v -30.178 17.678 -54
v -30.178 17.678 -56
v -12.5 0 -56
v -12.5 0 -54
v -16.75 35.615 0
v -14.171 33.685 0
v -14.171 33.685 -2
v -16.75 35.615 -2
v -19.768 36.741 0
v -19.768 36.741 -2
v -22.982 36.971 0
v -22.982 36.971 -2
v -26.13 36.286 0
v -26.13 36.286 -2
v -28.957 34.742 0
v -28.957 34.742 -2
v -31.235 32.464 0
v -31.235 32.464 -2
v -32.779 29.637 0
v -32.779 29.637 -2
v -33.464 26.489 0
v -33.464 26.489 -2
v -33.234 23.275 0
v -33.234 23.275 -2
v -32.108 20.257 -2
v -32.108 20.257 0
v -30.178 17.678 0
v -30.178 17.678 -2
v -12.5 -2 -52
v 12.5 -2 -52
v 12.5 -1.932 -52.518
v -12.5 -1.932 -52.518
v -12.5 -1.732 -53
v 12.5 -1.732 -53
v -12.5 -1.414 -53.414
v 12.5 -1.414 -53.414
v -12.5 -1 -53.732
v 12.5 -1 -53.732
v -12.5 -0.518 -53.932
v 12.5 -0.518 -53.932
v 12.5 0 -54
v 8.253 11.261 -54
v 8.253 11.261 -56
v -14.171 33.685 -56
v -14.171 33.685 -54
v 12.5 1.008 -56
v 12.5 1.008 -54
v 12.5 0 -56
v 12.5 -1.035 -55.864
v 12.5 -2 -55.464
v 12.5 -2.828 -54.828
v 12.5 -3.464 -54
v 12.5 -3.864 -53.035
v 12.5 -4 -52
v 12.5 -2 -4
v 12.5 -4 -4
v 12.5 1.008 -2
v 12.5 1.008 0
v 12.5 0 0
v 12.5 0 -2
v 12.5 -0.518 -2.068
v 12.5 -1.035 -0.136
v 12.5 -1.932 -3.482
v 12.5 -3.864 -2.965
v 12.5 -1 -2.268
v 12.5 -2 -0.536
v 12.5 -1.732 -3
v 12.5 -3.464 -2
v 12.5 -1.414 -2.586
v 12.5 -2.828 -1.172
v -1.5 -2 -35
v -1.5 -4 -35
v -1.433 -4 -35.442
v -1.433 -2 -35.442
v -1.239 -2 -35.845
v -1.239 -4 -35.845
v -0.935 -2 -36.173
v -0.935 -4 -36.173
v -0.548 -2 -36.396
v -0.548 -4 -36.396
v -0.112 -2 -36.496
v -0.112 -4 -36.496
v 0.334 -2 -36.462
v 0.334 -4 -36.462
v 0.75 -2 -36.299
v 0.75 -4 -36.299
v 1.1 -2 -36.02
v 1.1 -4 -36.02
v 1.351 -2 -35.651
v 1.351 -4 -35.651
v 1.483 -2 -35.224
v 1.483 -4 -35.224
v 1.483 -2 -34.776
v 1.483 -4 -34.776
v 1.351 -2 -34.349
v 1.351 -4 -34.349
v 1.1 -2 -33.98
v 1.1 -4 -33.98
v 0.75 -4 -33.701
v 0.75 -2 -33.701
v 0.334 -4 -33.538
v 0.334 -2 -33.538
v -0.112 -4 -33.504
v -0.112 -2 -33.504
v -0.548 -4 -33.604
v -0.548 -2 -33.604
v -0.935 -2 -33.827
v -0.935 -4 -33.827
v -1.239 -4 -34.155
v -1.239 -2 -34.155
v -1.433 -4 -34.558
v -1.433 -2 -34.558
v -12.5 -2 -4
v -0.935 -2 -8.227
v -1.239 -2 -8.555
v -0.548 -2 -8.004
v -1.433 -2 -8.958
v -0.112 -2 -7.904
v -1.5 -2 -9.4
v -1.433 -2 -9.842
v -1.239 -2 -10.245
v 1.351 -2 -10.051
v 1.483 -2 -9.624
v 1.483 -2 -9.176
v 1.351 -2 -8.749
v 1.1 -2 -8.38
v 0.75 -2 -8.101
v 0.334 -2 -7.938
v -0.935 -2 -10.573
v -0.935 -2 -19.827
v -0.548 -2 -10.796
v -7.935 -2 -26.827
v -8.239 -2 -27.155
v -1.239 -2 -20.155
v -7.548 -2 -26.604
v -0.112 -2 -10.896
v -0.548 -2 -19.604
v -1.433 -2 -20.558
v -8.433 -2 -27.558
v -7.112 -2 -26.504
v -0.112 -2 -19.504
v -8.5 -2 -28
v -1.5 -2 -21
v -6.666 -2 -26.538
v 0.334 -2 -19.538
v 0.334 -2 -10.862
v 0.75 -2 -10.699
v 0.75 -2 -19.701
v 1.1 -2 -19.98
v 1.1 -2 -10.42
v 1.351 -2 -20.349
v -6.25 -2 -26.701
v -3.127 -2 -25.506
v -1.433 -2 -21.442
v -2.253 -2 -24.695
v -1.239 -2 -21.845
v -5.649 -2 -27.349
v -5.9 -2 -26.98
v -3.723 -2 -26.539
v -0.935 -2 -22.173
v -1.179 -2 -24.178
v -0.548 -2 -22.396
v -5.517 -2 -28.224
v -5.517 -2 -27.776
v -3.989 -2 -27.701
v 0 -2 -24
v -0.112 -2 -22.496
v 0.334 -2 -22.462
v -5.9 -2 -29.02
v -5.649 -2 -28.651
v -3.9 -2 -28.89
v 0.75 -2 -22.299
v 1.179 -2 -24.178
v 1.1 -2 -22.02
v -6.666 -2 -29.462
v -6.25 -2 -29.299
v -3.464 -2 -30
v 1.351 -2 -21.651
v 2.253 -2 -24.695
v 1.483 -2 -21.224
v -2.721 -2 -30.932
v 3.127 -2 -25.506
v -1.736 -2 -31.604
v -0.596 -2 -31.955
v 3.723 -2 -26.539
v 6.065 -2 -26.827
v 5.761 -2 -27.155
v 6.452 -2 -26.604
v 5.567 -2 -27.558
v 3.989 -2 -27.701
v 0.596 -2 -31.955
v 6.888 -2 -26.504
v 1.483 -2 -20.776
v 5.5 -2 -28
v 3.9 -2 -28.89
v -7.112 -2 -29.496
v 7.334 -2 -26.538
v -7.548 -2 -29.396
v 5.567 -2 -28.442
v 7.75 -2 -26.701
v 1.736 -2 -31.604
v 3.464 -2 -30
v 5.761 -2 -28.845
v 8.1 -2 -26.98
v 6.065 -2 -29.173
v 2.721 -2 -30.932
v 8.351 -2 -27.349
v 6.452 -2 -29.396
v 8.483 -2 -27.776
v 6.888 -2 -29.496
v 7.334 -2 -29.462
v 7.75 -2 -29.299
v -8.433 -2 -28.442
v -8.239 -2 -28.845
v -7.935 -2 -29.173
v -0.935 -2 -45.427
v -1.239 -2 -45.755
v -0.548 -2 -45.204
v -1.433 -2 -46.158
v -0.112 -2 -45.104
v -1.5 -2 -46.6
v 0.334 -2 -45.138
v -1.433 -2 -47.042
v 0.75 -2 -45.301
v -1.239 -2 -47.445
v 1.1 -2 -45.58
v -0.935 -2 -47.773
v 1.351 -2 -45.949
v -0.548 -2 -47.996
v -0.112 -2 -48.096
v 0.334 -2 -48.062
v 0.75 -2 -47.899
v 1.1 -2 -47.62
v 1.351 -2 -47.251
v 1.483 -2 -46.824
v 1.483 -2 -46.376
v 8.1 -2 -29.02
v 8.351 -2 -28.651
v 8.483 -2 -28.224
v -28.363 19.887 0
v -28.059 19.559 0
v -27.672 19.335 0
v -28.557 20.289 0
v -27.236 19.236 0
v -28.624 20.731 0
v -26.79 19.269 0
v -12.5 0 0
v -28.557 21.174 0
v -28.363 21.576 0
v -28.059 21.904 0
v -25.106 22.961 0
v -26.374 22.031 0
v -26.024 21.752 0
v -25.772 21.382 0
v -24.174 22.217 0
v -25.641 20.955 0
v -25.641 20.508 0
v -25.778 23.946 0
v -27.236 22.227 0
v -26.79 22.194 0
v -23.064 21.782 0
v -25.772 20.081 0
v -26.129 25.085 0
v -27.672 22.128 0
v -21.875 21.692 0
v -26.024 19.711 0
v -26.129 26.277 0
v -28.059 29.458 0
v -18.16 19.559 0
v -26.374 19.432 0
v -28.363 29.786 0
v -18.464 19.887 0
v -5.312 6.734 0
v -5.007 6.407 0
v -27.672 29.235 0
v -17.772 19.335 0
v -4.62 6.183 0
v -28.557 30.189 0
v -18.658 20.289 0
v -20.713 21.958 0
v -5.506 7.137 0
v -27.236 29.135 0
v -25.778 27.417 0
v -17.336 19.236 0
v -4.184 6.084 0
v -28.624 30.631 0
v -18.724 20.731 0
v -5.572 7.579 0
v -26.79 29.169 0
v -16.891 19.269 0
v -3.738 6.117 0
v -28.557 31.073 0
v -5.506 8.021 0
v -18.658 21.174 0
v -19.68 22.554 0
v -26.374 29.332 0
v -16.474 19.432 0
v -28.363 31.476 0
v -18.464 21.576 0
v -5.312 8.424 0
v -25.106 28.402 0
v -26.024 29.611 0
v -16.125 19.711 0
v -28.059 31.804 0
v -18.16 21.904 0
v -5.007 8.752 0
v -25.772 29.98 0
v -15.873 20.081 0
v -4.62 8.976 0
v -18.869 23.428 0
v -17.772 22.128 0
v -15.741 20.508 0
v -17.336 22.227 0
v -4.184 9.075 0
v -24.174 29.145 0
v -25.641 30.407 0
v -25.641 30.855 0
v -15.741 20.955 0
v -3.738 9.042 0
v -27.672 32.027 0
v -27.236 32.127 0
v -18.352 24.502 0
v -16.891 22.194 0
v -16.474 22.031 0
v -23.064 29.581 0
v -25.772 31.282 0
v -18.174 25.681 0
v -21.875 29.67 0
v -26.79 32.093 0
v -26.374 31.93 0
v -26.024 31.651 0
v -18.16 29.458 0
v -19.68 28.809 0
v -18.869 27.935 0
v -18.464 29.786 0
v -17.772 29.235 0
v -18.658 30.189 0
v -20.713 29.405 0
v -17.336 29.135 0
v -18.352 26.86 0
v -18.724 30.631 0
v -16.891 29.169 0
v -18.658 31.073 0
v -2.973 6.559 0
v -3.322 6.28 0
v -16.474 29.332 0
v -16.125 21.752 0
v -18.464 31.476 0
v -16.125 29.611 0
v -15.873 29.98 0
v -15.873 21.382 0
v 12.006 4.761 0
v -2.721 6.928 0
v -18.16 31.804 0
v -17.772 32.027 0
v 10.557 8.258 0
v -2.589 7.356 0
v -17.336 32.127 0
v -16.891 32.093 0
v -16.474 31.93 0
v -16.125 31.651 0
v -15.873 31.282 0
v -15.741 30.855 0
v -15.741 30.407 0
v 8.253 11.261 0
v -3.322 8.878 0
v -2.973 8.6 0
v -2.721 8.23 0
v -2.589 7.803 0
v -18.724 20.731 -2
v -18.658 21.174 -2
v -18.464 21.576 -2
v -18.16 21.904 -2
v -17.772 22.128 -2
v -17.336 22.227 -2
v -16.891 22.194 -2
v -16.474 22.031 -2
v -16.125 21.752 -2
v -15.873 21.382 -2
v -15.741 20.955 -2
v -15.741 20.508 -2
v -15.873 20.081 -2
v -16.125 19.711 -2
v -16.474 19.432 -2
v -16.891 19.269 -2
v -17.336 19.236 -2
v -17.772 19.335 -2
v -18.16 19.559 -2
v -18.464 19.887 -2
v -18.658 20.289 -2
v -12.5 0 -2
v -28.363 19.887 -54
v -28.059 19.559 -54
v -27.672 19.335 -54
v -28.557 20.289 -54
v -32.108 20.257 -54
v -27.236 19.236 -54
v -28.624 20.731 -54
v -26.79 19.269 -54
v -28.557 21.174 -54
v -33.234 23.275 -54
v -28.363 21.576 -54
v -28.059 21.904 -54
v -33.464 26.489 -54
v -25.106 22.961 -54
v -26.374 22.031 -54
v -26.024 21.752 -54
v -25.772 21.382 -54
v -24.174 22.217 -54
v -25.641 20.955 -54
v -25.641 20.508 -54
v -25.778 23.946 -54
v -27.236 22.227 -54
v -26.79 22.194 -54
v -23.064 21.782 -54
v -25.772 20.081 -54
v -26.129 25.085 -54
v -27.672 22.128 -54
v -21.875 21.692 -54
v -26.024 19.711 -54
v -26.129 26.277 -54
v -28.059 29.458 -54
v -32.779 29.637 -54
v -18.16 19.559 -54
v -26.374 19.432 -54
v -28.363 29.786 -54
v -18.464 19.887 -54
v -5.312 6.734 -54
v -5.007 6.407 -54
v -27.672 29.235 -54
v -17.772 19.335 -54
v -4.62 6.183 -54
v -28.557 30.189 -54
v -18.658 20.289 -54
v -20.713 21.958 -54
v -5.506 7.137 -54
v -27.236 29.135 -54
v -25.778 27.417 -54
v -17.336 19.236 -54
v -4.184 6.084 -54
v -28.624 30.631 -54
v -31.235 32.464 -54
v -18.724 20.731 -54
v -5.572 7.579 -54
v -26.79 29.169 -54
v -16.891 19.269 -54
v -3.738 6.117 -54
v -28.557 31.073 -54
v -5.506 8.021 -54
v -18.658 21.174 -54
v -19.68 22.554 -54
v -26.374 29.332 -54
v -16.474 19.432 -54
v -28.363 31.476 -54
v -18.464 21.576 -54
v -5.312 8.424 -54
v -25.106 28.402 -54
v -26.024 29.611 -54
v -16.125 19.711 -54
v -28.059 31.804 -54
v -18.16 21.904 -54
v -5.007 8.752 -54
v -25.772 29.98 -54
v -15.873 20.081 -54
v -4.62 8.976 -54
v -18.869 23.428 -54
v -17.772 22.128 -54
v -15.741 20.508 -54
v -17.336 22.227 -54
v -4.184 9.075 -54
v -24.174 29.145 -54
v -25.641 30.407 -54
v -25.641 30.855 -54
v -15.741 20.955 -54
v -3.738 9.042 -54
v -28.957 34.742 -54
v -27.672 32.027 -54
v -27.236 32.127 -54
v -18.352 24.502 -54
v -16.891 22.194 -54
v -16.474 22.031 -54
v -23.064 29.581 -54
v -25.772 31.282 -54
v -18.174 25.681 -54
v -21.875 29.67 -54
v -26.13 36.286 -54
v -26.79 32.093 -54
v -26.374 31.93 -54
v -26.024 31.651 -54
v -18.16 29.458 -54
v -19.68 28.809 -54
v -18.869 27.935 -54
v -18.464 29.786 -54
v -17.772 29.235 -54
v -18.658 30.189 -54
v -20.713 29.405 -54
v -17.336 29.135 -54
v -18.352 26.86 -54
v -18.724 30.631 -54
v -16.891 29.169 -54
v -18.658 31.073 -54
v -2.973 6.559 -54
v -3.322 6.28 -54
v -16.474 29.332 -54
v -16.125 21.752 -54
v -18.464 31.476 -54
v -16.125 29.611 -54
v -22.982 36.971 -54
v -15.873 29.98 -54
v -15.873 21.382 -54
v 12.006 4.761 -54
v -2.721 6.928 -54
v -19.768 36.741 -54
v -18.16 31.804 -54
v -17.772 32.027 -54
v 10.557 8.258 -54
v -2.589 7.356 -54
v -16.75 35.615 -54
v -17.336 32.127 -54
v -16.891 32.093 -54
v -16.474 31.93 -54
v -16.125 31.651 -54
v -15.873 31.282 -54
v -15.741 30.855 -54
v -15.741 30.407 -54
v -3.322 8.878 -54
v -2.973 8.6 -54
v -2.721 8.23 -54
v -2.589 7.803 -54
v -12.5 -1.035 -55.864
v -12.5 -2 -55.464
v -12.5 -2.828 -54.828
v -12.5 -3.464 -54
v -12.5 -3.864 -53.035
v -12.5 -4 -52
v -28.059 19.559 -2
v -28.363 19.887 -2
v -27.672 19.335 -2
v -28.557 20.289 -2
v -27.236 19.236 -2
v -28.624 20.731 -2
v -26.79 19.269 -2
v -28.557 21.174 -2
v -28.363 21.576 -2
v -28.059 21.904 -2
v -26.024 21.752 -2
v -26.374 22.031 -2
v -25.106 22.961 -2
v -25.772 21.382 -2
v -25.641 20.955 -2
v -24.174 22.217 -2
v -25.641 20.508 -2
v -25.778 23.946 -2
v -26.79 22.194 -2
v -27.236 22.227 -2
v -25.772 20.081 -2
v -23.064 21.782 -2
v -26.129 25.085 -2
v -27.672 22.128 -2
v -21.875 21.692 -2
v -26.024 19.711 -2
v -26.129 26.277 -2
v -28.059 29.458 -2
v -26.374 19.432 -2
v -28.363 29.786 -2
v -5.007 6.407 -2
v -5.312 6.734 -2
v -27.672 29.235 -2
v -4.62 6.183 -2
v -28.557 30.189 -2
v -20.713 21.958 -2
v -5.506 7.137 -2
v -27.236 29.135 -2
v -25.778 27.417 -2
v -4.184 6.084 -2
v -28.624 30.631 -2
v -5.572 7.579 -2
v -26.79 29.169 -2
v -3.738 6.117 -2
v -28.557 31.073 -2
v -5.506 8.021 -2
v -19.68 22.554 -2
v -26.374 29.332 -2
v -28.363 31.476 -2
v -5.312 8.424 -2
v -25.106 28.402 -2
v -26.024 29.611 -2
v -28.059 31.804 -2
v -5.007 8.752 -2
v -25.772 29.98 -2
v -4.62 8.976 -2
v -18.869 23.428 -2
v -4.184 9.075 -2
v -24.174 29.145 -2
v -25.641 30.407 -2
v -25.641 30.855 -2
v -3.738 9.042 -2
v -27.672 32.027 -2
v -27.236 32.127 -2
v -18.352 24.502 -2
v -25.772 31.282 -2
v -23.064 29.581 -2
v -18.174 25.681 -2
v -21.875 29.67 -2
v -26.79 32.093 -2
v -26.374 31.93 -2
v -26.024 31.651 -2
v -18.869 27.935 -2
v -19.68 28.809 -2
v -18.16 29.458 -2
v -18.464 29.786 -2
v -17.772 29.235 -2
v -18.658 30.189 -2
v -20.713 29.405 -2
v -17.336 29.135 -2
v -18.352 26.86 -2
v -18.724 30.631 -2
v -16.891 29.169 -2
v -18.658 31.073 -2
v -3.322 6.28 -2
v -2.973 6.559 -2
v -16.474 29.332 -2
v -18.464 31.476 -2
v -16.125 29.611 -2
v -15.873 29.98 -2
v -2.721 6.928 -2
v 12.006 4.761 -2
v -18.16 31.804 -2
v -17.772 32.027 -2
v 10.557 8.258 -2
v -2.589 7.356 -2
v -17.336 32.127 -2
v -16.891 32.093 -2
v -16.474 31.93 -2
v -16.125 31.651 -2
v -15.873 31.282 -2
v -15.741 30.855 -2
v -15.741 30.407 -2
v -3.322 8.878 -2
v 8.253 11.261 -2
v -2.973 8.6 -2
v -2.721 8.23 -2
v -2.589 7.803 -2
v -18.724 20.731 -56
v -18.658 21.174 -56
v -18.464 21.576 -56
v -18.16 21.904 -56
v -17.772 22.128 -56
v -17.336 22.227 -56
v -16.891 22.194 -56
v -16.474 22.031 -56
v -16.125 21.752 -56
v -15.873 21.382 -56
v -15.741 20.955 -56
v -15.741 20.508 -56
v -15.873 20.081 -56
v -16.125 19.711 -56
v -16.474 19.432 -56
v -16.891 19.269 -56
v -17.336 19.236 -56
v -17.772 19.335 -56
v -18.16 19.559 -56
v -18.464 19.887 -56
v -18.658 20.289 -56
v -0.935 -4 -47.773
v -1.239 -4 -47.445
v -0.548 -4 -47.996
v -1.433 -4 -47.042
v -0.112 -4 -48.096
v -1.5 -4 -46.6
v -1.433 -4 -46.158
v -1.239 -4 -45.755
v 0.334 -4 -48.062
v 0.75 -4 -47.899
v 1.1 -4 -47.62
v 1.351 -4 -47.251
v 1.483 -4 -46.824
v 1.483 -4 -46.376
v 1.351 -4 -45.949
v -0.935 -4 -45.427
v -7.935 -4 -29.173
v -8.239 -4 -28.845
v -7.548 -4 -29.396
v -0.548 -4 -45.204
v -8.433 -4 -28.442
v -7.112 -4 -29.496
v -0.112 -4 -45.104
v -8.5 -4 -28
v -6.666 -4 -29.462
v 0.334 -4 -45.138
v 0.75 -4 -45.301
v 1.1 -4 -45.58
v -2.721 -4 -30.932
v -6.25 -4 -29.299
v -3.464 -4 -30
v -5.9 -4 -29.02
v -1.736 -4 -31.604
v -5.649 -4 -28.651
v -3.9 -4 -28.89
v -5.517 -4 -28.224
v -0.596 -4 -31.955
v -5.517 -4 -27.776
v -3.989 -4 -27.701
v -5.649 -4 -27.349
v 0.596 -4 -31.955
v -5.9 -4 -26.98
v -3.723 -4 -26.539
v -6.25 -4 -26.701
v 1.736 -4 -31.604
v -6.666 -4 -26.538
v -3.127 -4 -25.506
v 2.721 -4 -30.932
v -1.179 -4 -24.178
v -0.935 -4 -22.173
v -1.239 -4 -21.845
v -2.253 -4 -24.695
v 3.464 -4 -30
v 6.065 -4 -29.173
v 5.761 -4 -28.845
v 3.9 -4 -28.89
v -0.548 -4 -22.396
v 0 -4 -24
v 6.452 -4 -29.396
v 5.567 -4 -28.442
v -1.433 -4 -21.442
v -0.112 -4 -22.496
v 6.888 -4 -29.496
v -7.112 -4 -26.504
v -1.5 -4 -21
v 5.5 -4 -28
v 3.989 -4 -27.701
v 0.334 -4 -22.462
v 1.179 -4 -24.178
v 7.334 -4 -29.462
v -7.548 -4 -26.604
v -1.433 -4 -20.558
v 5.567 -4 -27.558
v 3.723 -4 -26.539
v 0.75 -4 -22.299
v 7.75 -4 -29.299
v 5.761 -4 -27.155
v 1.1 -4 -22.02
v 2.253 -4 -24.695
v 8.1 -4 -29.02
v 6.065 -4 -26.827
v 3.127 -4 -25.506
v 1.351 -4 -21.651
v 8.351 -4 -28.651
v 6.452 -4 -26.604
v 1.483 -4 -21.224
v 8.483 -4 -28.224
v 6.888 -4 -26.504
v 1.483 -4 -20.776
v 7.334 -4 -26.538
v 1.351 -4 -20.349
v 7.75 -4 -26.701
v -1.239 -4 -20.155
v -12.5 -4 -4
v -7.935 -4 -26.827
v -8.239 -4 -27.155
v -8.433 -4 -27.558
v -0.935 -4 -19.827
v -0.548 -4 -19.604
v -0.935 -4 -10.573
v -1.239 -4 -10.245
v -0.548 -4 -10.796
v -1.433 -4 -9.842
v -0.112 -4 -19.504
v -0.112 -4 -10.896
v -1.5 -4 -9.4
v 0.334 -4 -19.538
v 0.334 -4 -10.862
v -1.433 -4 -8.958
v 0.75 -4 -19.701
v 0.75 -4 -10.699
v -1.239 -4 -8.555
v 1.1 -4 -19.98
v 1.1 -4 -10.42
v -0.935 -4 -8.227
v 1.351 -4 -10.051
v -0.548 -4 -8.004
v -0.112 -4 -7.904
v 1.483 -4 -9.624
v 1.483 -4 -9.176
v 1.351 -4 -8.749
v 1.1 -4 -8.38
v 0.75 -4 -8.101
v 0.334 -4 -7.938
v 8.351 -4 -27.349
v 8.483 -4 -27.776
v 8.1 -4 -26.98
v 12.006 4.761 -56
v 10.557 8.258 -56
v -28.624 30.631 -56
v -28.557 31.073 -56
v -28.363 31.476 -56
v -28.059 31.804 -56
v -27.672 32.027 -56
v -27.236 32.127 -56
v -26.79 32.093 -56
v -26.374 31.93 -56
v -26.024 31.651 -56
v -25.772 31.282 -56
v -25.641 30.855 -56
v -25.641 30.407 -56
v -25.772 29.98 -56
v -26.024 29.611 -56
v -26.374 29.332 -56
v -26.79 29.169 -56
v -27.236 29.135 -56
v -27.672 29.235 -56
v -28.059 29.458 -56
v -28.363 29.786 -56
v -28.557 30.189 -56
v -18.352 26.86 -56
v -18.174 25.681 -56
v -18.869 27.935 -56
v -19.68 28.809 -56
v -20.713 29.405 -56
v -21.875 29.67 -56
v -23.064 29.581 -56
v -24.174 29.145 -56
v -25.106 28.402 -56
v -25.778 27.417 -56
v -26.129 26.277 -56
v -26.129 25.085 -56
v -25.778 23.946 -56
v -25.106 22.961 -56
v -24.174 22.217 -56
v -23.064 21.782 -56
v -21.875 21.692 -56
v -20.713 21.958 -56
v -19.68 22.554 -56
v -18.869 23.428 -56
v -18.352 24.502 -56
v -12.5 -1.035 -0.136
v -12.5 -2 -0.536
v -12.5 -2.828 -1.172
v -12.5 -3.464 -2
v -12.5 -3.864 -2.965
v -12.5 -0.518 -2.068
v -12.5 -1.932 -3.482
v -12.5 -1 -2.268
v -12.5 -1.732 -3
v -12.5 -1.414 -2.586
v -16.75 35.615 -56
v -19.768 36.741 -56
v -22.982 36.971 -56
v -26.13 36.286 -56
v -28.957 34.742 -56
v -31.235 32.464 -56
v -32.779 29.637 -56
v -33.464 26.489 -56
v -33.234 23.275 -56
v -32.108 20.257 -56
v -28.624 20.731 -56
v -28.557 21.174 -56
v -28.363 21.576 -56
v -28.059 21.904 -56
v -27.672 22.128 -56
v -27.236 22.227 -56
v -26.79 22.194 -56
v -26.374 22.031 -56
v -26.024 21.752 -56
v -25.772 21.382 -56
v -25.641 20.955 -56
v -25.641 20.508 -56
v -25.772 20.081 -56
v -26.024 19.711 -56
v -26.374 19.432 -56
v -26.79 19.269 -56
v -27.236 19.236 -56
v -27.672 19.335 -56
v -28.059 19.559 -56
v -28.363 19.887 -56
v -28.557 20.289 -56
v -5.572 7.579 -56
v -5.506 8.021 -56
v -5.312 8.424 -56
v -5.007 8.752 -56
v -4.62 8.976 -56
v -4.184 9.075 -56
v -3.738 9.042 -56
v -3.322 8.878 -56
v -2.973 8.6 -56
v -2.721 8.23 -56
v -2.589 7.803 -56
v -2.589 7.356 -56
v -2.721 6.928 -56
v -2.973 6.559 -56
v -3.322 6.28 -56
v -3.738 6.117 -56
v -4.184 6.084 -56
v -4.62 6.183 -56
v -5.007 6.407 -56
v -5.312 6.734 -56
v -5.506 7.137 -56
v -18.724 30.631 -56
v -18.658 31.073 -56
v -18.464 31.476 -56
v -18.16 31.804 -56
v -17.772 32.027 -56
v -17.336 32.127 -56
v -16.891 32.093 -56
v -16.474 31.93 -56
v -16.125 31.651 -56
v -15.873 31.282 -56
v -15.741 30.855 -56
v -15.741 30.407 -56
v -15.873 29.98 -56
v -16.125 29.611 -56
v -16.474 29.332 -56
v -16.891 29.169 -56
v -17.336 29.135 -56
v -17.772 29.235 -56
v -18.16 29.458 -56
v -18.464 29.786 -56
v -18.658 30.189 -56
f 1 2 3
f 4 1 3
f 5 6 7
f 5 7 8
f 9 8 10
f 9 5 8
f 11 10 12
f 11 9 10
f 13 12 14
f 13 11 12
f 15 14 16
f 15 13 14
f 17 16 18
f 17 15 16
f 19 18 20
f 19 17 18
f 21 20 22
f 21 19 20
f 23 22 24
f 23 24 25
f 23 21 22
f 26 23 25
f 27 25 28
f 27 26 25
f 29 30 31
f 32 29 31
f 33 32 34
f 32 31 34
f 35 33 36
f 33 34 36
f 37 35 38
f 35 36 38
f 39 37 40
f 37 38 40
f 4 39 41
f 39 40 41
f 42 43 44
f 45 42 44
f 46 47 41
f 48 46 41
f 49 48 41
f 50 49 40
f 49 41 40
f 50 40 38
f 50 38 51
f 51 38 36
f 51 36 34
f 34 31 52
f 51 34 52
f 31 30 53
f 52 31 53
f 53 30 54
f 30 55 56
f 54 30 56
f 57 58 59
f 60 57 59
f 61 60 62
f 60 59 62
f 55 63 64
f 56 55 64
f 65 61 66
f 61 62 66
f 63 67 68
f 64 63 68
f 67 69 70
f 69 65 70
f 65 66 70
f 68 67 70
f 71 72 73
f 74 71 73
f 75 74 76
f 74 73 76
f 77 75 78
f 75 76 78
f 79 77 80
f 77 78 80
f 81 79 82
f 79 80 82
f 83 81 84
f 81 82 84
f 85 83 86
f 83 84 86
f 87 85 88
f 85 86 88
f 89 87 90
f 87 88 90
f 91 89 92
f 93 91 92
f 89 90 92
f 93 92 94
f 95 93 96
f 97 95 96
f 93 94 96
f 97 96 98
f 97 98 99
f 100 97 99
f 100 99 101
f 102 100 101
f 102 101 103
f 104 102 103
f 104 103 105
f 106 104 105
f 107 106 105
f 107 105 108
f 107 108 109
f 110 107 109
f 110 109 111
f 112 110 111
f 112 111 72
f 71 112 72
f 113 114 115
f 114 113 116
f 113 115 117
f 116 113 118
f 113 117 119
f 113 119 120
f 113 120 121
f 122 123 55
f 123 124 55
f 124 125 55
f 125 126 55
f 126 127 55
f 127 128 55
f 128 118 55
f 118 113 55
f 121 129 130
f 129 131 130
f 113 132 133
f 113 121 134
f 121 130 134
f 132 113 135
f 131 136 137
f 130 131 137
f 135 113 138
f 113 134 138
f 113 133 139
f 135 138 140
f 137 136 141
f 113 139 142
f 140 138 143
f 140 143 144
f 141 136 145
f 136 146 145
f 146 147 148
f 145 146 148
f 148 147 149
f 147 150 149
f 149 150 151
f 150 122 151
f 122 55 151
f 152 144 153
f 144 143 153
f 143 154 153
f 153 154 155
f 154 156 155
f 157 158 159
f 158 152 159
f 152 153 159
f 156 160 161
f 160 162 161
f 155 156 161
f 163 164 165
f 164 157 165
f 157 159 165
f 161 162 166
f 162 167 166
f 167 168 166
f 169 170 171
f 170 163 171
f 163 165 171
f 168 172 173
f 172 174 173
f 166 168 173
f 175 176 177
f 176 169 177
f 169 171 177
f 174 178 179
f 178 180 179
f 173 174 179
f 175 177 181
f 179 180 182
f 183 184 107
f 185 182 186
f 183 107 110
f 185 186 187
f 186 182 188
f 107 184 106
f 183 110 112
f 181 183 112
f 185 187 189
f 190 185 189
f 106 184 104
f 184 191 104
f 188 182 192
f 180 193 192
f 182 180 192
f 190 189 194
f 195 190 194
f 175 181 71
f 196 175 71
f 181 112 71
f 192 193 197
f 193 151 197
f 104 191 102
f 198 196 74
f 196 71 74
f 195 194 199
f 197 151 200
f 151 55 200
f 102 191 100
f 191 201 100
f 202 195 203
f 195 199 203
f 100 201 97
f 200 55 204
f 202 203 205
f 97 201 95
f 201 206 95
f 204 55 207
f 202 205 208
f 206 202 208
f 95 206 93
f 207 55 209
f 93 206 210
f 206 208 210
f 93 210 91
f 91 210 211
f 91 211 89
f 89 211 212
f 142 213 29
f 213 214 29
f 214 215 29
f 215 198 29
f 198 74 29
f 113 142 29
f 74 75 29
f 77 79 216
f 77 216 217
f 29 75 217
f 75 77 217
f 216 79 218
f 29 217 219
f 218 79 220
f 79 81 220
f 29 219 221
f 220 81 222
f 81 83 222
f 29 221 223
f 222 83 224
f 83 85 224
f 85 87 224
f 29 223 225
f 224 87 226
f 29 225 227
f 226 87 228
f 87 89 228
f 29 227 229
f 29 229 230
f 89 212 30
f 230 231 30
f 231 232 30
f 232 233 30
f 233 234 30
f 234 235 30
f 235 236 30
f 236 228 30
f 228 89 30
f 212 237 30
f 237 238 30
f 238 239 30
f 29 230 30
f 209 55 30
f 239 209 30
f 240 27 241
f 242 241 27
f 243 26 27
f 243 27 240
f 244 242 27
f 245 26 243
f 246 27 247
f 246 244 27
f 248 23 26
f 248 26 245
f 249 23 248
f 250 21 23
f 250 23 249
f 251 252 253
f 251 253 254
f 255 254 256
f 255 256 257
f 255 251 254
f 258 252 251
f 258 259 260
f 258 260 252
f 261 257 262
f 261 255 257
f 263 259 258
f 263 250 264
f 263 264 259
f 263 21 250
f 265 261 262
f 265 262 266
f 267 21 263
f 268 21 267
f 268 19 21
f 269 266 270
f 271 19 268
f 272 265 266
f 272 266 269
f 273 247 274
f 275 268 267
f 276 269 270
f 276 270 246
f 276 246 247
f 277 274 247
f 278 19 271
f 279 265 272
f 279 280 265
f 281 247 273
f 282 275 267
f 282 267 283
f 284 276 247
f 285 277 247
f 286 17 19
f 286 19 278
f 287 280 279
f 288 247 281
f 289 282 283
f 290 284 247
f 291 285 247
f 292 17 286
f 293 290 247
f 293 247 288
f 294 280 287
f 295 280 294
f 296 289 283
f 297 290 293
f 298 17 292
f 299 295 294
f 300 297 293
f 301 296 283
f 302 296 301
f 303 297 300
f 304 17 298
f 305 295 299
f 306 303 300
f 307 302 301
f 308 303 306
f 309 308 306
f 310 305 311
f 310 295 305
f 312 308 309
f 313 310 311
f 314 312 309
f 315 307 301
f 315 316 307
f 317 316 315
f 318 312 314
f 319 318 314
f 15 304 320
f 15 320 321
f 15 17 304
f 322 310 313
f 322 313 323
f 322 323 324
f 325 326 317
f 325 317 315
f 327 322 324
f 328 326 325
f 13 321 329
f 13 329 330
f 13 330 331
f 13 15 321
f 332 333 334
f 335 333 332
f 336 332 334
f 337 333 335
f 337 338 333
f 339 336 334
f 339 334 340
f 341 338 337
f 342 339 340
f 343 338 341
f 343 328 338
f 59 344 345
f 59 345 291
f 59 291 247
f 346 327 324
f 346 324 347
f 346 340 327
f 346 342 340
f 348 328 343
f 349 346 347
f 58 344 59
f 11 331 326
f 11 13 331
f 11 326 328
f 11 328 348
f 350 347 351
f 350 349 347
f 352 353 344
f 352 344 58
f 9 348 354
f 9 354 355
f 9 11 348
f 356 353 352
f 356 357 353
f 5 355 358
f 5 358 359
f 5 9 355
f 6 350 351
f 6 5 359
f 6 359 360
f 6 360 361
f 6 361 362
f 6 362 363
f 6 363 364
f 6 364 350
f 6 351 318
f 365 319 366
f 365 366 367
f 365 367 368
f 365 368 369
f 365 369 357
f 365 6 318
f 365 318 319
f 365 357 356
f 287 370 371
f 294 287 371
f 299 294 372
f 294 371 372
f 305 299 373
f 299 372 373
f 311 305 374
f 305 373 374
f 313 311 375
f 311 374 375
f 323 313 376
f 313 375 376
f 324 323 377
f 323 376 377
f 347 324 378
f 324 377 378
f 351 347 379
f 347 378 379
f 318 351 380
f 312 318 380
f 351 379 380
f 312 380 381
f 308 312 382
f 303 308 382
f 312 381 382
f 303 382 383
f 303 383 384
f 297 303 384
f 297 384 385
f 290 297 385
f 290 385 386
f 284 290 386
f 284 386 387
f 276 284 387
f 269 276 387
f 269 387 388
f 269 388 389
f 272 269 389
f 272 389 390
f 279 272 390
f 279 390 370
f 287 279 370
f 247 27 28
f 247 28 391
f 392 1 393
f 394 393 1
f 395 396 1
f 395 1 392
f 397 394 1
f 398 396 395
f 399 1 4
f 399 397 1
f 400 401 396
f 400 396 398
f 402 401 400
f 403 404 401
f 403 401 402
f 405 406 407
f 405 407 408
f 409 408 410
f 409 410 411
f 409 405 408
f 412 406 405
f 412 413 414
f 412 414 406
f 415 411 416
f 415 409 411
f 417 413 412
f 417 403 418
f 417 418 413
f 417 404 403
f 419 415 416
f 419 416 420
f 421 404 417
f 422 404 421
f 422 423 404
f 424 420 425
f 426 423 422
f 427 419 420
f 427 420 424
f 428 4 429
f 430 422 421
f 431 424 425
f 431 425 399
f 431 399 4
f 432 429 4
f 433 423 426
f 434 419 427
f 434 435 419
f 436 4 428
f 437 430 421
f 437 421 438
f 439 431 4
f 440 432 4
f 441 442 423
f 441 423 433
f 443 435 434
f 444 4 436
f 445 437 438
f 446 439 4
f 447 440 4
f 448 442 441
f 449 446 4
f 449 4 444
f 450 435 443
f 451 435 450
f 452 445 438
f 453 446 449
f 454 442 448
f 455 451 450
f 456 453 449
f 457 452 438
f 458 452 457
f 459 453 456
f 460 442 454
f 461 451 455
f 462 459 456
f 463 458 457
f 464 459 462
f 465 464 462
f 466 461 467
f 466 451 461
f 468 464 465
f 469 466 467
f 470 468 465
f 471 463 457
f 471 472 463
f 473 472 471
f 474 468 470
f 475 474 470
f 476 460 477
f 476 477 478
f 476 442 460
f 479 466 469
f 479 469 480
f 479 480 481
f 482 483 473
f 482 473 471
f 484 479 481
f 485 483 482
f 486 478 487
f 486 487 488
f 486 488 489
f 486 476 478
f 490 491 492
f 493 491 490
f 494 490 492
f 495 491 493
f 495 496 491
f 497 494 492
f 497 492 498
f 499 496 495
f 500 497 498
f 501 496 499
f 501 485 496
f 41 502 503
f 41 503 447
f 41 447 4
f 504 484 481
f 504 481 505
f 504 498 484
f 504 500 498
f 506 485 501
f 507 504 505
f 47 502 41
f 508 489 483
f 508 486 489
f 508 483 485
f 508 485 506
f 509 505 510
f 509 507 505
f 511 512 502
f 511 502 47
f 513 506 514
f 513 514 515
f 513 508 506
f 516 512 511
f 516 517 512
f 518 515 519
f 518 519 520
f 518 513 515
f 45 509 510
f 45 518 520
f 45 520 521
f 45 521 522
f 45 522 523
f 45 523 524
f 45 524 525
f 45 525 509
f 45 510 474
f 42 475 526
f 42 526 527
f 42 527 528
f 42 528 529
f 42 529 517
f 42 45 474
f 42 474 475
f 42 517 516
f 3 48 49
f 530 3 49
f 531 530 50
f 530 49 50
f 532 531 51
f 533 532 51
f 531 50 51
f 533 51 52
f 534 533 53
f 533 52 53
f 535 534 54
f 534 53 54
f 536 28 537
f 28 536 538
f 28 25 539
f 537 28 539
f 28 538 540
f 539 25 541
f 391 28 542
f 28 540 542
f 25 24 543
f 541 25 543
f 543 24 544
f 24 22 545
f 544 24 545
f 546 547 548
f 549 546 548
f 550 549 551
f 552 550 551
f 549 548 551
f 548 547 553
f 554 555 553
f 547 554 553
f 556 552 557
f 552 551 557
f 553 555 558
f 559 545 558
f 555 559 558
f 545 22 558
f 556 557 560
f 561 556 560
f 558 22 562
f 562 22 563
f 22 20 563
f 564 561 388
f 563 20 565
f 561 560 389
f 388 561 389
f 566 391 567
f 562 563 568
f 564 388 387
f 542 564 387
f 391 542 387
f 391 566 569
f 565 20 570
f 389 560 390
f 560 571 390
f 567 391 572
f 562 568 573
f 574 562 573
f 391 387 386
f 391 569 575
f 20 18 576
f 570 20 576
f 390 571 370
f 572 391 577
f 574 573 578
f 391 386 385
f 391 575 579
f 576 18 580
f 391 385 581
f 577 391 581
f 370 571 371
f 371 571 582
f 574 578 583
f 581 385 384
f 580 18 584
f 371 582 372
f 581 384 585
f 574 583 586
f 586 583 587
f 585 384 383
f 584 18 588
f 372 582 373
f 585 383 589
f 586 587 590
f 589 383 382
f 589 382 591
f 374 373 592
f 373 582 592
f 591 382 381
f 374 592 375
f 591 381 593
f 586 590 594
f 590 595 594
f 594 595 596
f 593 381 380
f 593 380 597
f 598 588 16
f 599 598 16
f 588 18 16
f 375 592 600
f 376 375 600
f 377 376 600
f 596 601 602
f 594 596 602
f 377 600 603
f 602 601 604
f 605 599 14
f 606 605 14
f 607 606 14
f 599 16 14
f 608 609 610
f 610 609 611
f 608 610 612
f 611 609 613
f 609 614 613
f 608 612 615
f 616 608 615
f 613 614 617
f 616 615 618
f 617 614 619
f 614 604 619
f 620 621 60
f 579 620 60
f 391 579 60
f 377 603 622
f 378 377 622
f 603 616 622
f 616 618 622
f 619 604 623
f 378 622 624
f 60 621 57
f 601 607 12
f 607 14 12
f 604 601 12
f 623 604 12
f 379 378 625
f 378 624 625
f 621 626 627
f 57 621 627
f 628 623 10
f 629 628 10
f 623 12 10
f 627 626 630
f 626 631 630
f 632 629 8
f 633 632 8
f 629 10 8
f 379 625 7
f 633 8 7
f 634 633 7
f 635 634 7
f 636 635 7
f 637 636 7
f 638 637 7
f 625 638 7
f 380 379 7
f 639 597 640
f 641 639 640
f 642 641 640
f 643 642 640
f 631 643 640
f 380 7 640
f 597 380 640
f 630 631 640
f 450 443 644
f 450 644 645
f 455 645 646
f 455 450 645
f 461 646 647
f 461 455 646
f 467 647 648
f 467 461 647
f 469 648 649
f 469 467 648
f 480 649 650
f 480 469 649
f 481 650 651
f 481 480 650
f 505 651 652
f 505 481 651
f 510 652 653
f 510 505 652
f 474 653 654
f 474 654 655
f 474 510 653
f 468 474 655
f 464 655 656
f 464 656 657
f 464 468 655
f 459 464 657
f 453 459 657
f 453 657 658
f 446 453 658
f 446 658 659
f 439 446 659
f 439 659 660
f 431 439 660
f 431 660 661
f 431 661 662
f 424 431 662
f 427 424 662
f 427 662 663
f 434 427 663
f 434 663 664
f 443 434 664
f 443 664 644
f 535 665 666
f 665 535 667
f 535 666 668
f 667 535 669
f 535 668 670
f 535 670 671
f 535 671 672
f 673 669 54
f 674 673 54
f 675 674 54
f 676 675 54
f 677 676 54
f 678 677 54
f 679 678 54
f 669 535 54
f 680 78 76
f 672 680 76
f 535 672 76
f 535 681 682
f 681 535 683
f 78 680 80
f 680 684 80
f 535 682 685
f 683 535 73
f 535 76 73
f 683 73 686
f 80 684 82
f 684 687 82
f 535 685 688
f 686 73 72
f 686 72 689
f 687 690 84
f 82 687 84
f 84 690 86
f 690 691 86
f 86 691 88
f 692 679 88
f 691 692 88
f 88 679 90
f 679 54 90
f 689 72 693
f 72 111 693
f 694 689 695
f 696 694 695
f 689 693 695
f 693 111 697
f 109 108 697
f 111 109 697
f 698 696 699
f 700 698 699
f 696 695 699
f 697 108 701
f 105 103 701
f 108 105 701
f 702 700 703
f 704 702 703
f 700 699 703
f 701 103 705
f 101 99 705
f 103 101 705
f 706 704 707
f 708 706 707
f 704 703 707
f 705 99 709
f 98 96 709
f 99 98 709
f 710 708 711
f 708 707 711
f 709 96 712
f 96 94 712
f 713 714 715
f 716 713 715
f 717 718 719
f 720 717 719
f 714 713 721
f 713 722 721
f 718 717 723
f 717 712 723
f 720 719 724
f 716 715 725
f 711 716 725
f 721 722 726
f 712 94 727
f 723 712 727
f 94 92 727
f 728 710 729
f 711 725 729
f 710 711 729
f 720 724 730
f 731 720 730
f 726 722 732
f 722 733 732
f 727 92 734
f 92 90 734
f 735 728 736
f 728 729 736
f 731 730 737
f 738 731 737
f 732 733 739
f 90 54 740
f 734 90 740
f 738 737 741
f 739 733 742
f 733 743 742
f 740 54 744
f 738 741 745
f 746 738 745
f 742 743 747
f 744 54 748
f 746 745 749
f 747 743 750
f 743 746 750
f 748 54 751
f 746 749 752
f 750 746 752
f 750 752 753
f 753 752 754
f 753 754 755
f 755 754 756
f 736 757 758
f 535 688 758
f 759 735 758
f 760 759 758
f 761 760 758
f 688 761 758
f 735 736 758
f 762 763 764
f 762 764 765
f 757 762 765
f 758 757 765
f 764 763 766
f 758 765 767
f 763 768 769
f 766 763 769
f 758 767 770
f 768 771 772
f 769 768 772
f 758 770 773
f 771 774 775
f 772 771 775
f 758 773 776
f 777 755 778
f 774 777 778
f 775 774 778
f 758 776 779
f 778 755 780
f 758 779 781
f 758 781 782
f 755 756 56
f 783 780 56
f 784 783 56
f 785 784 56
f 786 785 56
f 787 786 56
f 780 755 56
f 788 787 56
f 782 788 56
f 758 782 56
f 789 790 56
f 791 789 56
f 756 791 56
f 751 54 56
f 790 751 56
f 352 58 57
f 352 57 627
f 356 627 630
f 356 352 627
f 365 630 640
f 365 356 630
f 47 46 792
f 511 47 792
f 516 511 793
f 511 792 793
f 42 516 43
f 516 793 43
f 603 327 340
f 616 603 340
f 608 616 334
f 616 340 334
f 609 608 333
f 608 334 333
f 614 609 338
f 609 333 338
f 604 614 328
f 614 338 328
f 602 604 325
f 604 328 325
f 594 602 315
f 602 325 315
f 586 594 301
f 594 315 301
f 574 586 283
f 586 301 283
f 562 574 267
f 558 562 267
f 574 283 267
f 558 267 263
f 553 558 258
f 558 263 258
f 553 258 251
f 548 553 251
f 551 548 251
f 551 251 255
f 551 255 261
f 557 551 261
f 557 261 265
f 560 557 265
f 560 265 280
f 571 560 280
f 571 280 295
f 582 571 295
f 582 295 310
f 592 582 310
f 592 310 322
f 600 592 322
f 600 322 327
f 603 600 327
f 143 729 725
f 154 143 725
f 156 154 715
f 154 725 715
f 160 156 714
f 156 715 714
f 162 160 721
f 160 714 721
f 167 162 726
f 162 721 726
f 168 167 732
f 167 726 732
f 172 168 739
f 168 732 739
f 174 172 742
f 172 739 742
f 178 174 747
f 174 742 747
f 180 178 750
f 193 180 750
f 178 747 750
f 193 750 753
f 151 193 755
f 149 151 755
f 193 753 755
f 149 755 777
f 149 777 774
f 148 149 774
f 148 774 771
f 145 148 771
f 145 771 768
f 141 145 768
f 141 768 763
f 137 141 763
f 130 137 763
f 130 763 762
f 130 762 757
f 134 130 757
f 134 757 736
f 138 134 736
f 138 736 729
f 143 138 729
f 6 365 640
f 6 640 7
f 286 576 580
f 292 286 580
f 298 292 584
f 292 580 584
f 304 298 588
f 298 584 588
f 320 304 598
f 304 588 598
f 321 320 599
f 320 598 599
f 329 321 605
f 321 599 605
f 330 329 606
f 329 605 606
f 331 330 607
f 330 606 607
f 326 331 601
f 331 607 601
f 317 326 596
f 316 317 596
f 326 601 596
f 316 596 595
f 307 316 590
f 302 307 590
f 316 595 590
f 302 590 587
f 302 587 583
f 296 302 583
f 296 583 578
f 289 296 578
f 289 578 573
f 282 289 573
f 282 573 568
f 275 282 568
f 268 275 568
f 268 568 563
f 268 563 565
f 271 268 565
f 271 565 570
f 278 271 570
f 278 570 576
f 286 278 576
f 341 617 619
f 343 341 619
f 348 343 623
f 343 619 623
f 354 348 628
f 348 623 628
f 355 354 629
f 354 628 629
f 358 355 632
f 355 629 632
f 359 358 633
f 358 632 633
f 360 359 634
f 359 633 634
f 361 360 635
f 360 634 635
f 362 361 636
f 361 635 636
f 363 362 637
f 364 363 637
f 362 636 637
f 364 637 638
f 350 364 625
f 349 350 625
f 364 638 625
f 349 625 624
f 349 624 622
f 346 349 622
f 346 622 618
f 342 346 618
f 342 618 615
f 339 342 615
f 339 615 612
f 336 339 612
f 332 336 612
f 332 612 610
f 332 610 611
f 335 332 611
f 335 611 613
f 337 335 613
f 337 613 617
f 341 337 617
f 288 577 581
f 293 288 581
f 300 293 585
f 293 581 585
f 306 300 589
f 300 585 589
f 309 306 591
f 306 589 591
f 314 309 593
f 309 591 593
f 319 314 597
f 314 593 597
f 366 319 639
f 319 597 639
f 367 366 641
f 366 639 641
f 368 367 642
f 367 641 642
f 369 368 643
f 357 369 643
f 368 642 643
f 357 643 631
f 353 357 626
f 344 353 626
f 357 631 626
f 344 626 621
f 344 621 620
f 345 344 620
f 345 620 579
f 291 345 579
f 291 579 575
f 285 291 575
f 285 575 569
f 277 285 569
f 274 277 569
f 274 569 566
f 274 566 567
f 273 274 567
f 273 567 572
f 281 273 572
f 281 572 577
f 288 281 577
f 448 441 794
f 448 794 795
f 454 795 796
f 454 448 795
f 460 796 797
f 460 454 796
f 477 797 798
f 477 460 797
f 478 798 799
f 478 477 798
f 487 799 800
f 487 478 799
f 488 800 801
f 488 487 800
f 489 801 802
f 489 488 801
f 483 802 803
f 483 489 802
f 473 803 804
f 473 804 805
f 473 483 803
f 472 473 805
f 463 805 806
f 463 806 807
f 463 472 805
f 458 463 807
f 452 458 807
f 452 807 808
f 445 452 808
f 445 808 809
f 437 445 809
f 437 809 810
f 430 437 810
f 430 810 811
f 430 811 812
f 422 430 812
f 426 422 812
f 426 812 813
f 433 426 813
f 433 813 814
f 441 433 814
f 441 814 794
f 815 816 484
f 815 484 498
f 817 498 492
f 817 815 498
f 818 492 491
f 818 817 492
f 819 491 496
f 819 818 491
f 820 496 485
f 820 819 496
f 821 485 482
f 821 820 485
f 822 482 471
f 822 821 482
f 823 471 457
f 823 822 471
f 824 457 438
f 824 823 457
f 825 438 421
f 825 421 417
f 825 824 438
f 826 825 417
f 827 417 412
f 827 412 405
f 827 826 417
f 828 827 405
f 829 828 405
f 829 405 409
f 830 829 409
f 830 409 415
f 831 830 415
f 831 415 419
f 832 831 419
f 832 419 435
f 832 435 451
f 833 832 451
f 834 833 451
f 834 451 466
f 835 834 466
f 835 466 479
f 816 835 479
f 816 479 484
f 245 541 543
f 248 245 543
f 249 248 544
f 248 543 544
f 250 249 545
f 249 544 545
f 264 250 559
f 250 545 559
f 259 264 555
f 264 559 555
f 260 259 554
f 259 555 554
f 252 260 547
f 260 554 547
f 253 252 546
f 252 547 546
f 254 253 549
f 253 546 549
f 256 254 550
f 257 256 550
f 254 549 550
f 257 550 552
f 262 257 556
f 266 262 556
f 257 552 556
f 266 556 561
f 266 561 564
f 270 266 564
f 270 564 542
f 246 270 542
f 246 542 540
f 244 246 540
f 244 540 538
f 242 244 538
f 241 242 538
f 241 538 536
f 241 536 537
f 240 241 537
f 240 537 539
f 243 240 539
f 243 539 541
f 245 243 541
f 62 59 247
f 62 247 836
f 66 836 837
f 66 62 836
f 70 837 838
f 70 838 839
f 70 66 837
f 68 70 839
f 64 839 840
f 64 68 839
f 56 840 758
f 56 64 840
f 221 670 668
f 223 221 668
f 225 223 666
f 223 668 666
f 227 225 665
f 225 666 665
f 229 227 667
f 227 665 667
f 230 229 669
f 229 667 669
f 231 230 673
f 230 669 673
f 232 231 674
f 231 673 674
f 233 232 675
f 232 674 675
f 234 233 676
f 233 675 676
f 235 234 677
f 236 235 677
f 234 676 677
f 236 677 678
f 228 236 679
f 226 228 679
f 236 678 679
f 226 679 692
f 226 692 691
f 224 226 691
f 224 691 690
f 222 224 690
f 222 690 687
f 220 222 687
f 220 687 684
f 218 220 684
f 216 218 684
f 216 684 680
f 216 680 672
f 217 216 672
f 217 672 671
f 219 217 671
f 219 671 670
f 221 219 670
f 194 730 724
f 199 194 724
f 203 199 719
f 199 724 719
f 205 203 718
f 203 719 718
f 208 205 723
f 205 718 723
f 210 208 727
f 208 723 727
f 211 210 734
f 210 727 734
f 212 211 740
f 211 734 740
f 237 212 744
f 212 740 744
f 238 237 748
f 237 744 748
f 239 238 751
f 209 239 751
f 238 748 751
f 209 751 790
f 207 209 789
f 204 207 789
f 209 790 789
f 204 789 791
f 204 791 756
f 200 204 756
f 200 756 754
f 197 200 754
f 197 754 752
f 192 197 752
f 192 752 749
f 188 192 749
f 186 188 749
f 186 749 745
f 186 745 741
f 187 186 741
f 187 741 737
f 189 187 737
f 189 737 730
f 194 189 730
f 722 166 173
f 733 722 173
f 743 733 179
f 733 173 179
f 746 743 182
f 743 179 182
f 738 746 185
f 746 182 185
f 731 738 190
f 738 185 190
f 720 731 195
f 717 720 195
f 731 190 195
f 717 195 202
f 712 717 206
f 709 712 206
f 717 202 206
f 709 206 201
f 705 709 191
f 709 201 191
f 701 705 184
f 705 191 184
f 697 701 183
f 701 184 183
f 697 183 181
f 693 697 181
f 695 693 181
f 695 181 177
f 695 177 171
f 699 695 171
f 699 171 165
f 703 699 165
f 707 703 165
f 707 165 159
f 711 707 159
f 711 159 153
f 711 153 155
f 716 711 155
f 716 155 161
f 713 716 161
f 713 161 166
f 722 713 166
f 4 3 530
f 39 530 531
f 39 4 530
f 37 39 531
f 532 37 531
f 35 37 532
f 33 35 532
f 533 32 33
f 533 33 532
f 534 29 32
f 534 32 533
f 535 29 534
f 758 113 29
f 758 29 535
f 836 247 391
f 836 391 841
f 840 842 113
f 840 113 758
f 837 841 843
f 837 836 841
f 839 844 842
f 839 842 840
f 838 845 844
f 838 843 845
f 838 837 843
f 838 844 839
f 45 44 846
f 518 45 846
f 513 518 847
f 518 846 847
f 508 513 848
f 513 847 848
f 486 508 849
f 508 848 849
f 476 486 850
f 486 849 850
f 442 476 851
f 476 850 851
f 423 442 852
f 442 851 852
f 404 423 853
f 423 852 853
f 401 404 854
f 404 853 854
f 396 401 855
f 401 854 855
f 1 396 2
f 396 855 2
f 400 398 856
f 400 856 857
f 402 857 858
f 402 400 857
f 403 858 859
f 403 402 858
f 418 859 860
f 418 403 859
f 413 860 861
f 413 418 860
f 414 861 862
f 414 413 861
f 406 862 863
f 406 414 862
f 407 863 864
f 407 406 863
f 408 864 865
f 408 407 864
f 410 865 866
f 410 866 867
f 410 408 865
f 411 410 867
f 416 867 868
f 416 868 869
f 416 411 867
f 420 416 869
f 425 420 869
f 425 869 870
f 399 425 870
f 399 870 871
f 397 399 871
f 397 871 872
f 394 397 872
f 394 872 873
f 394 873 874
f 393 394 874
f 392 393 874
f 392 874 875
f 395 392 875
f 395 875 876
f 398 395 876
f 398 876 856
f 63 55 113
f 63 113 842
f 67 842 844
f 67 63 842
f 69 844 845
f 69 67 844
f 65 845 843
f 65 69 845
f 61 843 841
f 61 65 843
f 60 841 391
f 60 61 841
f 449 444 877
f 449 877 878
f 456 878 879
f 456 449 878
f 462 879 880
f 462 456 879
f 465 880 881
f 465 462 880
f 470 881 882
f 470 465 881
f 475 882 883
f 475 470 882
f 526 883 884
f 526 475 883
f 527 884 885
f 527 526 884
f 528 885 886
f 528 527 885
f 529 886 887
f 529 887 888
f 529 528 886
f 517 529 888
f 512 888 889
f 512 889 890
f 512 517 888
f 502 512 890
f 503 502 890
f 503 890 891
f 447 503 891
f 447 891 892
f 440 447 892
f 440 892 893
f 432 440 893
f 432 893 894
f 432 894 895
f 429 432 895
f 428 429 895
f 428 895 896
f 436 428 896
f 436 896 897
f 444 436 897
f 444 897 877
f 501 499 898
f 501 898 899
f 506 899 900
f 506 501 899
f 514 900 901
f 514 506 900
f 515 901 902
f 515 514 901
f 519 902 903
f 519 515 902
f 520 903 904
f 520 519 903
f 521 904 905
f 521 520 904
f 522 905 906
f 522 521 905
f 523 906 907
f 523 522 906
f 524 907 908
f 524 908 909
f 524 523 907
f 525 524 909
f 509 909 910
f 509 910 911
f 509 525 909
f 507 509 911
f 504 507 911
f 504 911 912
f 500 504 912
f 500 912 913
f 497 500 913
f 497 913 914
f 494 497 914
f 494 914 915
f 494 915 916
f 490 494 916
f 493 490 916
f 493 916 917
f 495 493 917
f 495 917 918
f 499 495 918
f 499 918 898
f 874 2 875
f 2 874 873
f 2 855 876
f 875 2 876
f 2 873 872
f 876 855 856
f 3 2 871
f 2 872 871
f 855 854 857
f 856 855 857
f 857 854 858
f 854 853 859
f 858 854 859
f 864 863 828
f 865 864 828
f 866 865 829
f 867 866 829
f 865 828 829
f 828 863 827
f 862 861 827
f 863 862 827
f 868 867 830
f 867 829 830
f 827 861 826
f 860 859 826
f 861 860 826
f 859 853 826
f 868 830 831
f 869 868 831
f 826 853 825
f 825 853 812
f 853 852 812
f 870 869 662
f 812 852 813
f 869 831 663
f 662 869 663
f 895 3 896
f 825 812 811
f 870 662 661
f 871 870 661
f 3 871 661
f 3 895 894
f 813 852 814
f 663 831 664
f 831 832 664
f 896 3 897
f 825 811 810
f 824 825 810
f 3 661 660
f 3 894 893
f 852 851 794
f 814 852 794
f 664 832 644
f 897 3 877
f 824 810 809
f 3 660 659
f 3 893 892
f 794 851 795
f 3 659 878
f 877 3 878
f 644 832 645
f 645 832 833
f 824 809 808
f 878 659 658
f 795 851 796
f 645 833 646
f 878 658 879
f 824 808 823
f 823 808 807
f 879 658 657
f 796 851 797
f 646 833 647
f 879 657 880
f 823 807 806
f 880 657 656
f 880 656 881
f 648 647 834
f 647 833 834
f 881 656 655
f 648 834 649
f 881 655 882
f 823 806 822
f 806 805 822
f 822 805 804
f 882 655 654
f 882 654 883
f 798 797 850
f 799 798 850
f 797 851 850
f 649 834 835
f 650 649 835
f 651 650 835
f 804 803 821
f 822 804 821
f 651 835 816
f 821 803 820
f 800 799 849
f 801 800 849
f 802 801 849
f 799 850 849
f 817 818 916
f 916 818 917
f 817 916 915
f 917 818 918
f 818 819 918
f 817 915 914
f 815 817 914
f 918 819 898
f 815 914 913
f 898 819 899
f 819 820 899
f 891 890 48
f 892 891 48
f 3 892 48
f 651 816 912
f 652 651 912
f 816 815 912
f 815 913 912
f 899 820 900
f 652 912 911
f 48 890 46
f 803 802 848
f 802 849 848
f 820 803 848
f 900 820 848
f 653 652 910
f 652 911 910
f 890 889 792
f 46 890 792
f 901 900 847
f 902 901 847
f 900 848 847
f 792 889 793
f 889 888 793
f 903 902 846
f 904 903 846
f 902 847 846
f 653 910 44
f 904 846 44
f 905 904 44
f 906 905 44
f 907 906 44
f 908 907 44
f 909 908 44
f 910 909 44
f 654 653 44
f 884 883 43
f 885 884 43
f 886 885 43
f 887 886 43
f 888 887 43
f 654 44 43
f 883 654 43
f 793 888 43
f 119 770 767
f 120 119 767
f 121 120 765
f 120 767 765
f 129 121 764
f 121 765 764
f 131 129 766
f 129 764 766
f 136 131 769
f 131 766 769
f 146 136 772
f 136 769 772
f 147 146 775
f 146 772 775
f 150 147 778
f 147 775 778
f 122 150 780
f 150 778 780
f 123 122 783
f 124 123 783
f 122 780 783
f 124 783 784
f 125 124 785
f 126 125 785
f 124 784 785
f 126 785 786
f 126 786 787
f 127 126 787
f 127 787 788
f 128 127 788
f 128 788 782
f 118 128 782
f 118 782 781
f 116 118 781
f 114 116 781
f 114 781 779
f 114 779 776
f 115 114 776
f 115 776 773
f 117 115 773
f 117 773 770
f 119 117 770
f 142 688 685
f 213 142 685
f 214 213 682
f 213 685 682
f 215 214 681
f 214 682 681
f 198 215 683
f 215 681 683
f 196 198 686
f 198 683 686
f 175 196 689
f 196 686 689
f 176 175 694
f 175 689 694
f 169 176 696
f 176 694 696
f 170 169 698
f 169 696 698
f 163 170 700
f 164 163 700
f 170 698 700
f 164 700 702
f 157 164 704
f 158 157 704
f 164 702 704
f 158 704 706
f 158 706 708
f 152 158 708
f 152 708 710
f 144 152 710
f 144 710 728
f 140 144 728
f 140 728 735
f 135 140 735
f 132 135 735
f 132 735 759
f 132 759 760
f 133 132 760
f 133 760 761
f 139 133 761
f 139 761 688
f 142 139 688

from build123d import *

# Parameters (mm, degrees)
BASE_FLANGE1_DEPTH    = 2
EDGE_FLANGE1_DEPTH    = 25
SKETCH19_R            = 4
CUT_EXTRUDE2_DEPTH    = 58.225619191
M3X0_5_TAPPED_HOLE1_D = 3
SKETCH22_R            = 4
CUT_EXTRUDE3_DEPTH    = 77.018231312
M3X0_5_TAPPED_HOLE2_D = 3


# Sheet-metal steps are written as plain solids
with BuildPart() as part:
    # Sketch8 → Base-Flange1 (new body)
    with BuildSketch(Plane.XY):
        with BuildLine():
            Line((-12.5, 0), (12.5, 0))
            Line((12.5, 0), (12.5, 1.008188695))
            ThreePointArc((12.5, 1.008188695), (11.396253221, 6.557098465), (8.253048327, 11.261237023))
            Line((8.253048327, 11.261237023), (-14.170526855, 33.684812205))
            ThreePointArc((-14.170526855, 33.684812205), (-30.17766953, 33.684812205), (-30.17766953, 17.67766953))
            Line((-30.17766953, 17.67766953), (-12.5, 0))
        make_face()
    extrude(amount=-BASE_FLANGE1_DEPTH)

    # Edge-Flange1 section (across the edge) → Edge-Flange1 (add)
    with BuildSketch(Plane(origin=(12.5, -2, -2), x_dir=(0, 1, 0), z_dir=(-1, 0, 0))):
        with BuildLine():
            Line((-2, 2), (-2, 26))
            Line((-2, 26), (0, 26))
            Line((0, 26), (0, 2))
            ThreePointArc((0, 2), (0.585786438, 0.585786438), (2, 0))
            Line((2, 0), (2, -2))
            ThreePointArc((2, -2), (-0.828427125, -0.828427125), (-2, 2))
        make_face()
    extrude(amount=EDGE_FLANGE1_DEPTH)

    # Sketch19 → Cut-Extrude2 (cut, through all)
    with BuildSketch(Plane.XY):
        with Locations((-22.174098192, 25.681240867)):
            Circle(SKETCH19_R)
    extrude(amount=-CUT_EXTRUDE2_DEPTH, mode=Mode.SUBTRACT)

    # M3x0.5 Tapped Hole1 (through all)
    with Locations(Plane.XY):
        with Locations((-27.123845661, 30.630988335), (-27.123845661, 20.731493399), (-17.224350724, 20.731493399), (-17.224350724, 30.630988335), (-4.072164594, 7.579307269)):
            Hole(M3X0_5_TAPPED_HOLE1_D / 2)

    # Mirror1: part across plane


with BuildPart() as part_1:
    add(part.part)
    add(part.part.mirror(Plane(origin=(12.5, -4, -28), x_dir=(1, 0, 0), z_dir=(0, 0, 1))))

    # Sketch22 → Cut-Extrude3 (cut, through all)
    with BuildSketch(Plane(origin=(0, -2, 0), x_dir=(1, 0, 0), z_dir=(0, 1, 0))):
        with Locations(Location((0, 28, 0), (0, 0, 270))):
            Circle(SKETCH22_R)
    extrude(amount=-CUT_EXTRUDE3_DEPTH, mode=Mode.SUBTRACT)

    # M3x0.5 Tapped Hole2 (through all)
    with Locations(Plane(origin=(0, -2, 0), x_dir=(1, 0, 0), z_dir=(0, 1, 0))):
        with Locations((7, 28), (-7, 28), (0, 35), (0, 21), (0, 9.4), (0, 46.6)):
            Hole(M3X0_5_TAPPED_HOLE2_D / 2)


solid = part_1.part
